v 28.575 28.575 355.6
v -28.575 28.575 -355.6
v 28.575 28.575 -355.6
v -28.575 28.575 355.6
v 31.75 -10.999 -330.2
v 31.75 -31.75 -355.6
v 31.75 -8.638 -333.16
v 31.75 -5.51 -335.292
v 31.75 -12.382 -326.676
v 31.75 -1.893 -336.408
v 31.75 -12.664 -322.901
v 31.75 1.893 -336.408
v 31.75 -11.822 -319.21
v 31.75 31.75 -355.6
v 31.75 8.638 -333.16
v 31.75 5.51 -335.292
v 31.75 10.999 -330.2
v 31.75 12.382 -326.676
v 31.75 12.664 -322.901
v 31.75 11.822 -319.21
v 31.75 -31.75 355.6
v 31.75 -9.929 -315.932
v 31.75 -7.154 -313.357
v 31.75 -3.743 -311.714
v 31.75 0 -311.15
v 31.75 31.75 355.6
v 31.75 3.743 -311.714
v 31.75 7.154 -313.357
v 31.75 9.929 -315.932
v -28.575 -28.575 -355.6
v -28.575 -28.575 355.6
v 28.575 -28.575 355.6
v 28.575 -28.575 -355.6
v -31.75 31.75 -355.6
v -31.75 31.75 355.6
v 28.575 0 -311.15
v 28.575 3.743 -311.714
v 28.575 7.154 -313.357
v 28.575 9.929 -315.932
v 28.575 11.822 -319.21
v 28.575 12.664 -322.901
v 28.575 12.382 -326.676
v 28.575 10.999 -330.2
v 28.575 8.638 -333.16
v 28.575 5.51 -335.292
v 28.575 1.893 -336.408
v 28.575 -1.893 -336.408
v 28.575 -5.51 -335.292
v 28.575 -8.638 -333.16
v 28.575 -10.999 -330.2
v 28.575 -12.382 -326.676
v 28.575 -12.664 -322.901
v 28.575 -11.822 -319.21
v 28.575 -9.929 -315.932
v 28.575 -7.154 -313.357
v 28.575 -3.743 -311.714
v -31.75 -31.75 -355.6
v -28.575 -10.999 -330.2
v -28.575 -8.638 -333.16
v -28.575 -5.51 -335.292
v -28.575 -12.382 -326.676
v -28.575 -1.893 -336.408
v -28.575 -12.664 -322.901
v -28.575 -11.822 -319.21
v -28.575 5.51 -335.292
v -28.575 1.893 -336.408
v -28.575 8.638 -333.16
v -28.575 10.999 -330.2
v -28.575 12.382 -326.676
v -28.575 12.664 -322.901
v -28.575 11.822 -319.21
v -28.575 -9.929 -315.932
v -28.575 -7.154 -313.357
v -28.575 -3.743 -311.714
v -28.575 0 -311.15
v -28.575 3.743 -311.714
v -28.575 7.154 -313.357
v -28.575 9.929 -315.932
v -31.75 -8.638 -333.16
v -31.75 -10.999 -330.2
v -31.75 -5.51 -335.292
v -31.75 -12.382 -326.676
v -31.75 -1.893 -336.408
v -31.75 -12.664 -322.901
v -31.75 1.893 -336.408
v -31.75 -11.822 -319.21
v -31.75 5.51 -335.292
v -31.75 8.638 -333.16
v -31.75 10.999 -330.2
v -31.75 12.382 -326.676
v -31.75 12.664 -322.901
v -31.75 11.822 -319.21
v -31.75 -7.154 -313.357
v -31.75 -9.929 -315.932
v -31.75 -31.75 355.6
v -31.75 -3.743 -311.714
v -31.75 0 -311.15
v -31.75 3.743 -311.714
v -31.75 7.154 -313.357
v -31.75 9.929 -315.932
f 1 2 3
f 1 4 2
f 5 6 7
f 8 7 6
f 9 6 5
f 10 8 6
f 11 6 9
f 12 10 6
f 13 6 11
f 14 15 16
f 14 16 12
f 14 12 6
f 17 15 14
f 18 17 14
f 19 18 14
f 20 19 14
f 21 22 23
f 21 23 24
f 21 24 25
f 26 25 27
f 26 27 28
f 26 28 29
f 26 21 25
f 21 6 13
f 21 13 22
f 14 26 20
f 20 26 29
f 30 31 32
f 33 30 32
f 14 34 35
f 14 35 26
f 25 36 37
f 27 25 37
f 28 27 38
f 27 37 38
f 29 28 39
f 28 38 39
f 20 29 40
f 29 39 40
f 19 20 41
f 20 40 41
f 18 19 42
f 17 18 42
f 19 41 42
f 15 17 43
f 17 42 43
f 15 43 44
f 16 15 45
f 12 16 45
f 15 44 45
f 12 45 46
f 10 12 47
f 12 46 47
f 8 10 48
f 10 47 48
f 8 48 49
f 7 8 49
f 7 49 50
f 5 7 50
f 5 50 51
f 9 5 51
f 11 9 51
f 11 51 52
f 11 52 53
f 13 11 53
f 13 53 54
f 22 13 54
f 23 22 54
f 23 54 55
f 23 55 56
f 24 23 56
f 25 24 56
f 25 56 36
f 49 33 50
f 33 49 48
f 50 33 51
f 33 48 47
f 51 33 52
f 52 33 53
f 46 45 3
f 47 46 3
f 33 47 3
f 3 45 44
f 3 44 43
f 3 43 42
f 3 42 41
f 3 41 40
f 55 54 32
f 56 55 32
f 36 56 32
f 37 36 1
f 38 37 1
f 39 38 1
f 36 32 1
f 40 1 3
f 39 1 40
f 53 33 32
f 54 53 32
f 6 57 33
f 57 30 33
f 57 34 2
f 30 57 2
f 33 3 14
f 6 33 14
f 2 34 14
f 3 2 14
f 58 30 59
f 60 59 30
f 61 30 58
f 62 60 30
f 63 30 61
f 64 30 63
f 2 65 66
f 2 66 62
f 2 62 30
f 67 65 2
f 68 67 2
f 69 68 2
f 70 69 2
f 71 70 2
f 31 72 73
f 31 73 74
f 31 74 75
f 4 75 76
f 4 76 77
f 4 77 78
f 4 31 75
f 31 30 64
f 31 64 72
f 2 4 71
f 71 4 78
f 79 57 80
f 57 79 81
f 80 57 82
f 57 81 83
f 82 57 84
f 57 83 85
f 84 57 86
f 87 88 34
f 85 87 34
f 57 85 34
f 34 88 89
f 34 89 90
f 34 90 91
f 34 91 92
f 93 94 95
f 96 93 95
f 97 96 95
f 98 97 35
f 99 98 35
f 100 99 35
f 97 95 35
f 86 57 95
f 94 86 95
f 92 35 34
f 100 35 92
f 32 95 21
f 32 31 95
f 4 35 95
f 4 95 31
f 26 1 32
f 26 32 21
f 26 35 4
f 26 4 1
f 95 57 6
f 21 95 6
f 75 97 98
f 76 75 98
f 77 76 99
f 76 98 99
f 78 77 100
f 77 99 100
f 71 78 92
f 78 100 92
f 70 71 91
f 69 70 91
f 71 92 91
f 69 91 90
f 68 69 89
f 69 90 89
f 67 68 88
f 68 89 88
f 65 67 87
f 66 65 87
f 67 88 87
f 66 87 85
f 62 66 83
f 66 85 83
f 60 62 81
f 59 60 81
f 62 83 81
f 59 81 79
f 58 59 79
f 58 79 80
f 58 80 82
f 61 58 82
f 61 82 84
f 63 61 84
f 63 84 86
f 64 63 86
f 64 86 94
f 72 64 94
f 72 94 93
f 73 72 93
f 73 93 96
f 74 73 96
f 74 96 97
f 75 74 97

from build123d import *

# Parameters (mm, degrees)
SKETCH1_W           = 63.5
SKETCH1_H           = 63.5
SKETCH1_W_2         = 57.15
SKETCH1_H_2         = 57.15
BOSS_EXTRUDE1_DEPTH = 355.6
SKETCH2_R           = 12.7
CUT_EXTRUDE1_DEPTH  = 363.617804996


with BuildPart() as part:
    # Sketch1 → Boss-Extrude1 (new, symmetric)
    with BuildSketch(Plane.XY):
        Rectangle(SKETCH1_W, SKETCH1_H)
        Rectangle(SKETCH1_W_2, SKETCH1_H_2, mode=Mode.SUBTRACT)
    extrude(amount=BOSS_EXTRUDE1_DEPTH, both=True)

    # Sketch2 → Cut-Extrude1 (cut, through all)
    with BuildSketch(Plane.ZY.offset(31.75)):
        with Locations((-323.85, 0)):
            Circle(SKETCH2_R)
    extrude(amount=-CUT_EXTRUDE1_DEPTH, mode=Mode.SUBTRACT)


solid = part.part
